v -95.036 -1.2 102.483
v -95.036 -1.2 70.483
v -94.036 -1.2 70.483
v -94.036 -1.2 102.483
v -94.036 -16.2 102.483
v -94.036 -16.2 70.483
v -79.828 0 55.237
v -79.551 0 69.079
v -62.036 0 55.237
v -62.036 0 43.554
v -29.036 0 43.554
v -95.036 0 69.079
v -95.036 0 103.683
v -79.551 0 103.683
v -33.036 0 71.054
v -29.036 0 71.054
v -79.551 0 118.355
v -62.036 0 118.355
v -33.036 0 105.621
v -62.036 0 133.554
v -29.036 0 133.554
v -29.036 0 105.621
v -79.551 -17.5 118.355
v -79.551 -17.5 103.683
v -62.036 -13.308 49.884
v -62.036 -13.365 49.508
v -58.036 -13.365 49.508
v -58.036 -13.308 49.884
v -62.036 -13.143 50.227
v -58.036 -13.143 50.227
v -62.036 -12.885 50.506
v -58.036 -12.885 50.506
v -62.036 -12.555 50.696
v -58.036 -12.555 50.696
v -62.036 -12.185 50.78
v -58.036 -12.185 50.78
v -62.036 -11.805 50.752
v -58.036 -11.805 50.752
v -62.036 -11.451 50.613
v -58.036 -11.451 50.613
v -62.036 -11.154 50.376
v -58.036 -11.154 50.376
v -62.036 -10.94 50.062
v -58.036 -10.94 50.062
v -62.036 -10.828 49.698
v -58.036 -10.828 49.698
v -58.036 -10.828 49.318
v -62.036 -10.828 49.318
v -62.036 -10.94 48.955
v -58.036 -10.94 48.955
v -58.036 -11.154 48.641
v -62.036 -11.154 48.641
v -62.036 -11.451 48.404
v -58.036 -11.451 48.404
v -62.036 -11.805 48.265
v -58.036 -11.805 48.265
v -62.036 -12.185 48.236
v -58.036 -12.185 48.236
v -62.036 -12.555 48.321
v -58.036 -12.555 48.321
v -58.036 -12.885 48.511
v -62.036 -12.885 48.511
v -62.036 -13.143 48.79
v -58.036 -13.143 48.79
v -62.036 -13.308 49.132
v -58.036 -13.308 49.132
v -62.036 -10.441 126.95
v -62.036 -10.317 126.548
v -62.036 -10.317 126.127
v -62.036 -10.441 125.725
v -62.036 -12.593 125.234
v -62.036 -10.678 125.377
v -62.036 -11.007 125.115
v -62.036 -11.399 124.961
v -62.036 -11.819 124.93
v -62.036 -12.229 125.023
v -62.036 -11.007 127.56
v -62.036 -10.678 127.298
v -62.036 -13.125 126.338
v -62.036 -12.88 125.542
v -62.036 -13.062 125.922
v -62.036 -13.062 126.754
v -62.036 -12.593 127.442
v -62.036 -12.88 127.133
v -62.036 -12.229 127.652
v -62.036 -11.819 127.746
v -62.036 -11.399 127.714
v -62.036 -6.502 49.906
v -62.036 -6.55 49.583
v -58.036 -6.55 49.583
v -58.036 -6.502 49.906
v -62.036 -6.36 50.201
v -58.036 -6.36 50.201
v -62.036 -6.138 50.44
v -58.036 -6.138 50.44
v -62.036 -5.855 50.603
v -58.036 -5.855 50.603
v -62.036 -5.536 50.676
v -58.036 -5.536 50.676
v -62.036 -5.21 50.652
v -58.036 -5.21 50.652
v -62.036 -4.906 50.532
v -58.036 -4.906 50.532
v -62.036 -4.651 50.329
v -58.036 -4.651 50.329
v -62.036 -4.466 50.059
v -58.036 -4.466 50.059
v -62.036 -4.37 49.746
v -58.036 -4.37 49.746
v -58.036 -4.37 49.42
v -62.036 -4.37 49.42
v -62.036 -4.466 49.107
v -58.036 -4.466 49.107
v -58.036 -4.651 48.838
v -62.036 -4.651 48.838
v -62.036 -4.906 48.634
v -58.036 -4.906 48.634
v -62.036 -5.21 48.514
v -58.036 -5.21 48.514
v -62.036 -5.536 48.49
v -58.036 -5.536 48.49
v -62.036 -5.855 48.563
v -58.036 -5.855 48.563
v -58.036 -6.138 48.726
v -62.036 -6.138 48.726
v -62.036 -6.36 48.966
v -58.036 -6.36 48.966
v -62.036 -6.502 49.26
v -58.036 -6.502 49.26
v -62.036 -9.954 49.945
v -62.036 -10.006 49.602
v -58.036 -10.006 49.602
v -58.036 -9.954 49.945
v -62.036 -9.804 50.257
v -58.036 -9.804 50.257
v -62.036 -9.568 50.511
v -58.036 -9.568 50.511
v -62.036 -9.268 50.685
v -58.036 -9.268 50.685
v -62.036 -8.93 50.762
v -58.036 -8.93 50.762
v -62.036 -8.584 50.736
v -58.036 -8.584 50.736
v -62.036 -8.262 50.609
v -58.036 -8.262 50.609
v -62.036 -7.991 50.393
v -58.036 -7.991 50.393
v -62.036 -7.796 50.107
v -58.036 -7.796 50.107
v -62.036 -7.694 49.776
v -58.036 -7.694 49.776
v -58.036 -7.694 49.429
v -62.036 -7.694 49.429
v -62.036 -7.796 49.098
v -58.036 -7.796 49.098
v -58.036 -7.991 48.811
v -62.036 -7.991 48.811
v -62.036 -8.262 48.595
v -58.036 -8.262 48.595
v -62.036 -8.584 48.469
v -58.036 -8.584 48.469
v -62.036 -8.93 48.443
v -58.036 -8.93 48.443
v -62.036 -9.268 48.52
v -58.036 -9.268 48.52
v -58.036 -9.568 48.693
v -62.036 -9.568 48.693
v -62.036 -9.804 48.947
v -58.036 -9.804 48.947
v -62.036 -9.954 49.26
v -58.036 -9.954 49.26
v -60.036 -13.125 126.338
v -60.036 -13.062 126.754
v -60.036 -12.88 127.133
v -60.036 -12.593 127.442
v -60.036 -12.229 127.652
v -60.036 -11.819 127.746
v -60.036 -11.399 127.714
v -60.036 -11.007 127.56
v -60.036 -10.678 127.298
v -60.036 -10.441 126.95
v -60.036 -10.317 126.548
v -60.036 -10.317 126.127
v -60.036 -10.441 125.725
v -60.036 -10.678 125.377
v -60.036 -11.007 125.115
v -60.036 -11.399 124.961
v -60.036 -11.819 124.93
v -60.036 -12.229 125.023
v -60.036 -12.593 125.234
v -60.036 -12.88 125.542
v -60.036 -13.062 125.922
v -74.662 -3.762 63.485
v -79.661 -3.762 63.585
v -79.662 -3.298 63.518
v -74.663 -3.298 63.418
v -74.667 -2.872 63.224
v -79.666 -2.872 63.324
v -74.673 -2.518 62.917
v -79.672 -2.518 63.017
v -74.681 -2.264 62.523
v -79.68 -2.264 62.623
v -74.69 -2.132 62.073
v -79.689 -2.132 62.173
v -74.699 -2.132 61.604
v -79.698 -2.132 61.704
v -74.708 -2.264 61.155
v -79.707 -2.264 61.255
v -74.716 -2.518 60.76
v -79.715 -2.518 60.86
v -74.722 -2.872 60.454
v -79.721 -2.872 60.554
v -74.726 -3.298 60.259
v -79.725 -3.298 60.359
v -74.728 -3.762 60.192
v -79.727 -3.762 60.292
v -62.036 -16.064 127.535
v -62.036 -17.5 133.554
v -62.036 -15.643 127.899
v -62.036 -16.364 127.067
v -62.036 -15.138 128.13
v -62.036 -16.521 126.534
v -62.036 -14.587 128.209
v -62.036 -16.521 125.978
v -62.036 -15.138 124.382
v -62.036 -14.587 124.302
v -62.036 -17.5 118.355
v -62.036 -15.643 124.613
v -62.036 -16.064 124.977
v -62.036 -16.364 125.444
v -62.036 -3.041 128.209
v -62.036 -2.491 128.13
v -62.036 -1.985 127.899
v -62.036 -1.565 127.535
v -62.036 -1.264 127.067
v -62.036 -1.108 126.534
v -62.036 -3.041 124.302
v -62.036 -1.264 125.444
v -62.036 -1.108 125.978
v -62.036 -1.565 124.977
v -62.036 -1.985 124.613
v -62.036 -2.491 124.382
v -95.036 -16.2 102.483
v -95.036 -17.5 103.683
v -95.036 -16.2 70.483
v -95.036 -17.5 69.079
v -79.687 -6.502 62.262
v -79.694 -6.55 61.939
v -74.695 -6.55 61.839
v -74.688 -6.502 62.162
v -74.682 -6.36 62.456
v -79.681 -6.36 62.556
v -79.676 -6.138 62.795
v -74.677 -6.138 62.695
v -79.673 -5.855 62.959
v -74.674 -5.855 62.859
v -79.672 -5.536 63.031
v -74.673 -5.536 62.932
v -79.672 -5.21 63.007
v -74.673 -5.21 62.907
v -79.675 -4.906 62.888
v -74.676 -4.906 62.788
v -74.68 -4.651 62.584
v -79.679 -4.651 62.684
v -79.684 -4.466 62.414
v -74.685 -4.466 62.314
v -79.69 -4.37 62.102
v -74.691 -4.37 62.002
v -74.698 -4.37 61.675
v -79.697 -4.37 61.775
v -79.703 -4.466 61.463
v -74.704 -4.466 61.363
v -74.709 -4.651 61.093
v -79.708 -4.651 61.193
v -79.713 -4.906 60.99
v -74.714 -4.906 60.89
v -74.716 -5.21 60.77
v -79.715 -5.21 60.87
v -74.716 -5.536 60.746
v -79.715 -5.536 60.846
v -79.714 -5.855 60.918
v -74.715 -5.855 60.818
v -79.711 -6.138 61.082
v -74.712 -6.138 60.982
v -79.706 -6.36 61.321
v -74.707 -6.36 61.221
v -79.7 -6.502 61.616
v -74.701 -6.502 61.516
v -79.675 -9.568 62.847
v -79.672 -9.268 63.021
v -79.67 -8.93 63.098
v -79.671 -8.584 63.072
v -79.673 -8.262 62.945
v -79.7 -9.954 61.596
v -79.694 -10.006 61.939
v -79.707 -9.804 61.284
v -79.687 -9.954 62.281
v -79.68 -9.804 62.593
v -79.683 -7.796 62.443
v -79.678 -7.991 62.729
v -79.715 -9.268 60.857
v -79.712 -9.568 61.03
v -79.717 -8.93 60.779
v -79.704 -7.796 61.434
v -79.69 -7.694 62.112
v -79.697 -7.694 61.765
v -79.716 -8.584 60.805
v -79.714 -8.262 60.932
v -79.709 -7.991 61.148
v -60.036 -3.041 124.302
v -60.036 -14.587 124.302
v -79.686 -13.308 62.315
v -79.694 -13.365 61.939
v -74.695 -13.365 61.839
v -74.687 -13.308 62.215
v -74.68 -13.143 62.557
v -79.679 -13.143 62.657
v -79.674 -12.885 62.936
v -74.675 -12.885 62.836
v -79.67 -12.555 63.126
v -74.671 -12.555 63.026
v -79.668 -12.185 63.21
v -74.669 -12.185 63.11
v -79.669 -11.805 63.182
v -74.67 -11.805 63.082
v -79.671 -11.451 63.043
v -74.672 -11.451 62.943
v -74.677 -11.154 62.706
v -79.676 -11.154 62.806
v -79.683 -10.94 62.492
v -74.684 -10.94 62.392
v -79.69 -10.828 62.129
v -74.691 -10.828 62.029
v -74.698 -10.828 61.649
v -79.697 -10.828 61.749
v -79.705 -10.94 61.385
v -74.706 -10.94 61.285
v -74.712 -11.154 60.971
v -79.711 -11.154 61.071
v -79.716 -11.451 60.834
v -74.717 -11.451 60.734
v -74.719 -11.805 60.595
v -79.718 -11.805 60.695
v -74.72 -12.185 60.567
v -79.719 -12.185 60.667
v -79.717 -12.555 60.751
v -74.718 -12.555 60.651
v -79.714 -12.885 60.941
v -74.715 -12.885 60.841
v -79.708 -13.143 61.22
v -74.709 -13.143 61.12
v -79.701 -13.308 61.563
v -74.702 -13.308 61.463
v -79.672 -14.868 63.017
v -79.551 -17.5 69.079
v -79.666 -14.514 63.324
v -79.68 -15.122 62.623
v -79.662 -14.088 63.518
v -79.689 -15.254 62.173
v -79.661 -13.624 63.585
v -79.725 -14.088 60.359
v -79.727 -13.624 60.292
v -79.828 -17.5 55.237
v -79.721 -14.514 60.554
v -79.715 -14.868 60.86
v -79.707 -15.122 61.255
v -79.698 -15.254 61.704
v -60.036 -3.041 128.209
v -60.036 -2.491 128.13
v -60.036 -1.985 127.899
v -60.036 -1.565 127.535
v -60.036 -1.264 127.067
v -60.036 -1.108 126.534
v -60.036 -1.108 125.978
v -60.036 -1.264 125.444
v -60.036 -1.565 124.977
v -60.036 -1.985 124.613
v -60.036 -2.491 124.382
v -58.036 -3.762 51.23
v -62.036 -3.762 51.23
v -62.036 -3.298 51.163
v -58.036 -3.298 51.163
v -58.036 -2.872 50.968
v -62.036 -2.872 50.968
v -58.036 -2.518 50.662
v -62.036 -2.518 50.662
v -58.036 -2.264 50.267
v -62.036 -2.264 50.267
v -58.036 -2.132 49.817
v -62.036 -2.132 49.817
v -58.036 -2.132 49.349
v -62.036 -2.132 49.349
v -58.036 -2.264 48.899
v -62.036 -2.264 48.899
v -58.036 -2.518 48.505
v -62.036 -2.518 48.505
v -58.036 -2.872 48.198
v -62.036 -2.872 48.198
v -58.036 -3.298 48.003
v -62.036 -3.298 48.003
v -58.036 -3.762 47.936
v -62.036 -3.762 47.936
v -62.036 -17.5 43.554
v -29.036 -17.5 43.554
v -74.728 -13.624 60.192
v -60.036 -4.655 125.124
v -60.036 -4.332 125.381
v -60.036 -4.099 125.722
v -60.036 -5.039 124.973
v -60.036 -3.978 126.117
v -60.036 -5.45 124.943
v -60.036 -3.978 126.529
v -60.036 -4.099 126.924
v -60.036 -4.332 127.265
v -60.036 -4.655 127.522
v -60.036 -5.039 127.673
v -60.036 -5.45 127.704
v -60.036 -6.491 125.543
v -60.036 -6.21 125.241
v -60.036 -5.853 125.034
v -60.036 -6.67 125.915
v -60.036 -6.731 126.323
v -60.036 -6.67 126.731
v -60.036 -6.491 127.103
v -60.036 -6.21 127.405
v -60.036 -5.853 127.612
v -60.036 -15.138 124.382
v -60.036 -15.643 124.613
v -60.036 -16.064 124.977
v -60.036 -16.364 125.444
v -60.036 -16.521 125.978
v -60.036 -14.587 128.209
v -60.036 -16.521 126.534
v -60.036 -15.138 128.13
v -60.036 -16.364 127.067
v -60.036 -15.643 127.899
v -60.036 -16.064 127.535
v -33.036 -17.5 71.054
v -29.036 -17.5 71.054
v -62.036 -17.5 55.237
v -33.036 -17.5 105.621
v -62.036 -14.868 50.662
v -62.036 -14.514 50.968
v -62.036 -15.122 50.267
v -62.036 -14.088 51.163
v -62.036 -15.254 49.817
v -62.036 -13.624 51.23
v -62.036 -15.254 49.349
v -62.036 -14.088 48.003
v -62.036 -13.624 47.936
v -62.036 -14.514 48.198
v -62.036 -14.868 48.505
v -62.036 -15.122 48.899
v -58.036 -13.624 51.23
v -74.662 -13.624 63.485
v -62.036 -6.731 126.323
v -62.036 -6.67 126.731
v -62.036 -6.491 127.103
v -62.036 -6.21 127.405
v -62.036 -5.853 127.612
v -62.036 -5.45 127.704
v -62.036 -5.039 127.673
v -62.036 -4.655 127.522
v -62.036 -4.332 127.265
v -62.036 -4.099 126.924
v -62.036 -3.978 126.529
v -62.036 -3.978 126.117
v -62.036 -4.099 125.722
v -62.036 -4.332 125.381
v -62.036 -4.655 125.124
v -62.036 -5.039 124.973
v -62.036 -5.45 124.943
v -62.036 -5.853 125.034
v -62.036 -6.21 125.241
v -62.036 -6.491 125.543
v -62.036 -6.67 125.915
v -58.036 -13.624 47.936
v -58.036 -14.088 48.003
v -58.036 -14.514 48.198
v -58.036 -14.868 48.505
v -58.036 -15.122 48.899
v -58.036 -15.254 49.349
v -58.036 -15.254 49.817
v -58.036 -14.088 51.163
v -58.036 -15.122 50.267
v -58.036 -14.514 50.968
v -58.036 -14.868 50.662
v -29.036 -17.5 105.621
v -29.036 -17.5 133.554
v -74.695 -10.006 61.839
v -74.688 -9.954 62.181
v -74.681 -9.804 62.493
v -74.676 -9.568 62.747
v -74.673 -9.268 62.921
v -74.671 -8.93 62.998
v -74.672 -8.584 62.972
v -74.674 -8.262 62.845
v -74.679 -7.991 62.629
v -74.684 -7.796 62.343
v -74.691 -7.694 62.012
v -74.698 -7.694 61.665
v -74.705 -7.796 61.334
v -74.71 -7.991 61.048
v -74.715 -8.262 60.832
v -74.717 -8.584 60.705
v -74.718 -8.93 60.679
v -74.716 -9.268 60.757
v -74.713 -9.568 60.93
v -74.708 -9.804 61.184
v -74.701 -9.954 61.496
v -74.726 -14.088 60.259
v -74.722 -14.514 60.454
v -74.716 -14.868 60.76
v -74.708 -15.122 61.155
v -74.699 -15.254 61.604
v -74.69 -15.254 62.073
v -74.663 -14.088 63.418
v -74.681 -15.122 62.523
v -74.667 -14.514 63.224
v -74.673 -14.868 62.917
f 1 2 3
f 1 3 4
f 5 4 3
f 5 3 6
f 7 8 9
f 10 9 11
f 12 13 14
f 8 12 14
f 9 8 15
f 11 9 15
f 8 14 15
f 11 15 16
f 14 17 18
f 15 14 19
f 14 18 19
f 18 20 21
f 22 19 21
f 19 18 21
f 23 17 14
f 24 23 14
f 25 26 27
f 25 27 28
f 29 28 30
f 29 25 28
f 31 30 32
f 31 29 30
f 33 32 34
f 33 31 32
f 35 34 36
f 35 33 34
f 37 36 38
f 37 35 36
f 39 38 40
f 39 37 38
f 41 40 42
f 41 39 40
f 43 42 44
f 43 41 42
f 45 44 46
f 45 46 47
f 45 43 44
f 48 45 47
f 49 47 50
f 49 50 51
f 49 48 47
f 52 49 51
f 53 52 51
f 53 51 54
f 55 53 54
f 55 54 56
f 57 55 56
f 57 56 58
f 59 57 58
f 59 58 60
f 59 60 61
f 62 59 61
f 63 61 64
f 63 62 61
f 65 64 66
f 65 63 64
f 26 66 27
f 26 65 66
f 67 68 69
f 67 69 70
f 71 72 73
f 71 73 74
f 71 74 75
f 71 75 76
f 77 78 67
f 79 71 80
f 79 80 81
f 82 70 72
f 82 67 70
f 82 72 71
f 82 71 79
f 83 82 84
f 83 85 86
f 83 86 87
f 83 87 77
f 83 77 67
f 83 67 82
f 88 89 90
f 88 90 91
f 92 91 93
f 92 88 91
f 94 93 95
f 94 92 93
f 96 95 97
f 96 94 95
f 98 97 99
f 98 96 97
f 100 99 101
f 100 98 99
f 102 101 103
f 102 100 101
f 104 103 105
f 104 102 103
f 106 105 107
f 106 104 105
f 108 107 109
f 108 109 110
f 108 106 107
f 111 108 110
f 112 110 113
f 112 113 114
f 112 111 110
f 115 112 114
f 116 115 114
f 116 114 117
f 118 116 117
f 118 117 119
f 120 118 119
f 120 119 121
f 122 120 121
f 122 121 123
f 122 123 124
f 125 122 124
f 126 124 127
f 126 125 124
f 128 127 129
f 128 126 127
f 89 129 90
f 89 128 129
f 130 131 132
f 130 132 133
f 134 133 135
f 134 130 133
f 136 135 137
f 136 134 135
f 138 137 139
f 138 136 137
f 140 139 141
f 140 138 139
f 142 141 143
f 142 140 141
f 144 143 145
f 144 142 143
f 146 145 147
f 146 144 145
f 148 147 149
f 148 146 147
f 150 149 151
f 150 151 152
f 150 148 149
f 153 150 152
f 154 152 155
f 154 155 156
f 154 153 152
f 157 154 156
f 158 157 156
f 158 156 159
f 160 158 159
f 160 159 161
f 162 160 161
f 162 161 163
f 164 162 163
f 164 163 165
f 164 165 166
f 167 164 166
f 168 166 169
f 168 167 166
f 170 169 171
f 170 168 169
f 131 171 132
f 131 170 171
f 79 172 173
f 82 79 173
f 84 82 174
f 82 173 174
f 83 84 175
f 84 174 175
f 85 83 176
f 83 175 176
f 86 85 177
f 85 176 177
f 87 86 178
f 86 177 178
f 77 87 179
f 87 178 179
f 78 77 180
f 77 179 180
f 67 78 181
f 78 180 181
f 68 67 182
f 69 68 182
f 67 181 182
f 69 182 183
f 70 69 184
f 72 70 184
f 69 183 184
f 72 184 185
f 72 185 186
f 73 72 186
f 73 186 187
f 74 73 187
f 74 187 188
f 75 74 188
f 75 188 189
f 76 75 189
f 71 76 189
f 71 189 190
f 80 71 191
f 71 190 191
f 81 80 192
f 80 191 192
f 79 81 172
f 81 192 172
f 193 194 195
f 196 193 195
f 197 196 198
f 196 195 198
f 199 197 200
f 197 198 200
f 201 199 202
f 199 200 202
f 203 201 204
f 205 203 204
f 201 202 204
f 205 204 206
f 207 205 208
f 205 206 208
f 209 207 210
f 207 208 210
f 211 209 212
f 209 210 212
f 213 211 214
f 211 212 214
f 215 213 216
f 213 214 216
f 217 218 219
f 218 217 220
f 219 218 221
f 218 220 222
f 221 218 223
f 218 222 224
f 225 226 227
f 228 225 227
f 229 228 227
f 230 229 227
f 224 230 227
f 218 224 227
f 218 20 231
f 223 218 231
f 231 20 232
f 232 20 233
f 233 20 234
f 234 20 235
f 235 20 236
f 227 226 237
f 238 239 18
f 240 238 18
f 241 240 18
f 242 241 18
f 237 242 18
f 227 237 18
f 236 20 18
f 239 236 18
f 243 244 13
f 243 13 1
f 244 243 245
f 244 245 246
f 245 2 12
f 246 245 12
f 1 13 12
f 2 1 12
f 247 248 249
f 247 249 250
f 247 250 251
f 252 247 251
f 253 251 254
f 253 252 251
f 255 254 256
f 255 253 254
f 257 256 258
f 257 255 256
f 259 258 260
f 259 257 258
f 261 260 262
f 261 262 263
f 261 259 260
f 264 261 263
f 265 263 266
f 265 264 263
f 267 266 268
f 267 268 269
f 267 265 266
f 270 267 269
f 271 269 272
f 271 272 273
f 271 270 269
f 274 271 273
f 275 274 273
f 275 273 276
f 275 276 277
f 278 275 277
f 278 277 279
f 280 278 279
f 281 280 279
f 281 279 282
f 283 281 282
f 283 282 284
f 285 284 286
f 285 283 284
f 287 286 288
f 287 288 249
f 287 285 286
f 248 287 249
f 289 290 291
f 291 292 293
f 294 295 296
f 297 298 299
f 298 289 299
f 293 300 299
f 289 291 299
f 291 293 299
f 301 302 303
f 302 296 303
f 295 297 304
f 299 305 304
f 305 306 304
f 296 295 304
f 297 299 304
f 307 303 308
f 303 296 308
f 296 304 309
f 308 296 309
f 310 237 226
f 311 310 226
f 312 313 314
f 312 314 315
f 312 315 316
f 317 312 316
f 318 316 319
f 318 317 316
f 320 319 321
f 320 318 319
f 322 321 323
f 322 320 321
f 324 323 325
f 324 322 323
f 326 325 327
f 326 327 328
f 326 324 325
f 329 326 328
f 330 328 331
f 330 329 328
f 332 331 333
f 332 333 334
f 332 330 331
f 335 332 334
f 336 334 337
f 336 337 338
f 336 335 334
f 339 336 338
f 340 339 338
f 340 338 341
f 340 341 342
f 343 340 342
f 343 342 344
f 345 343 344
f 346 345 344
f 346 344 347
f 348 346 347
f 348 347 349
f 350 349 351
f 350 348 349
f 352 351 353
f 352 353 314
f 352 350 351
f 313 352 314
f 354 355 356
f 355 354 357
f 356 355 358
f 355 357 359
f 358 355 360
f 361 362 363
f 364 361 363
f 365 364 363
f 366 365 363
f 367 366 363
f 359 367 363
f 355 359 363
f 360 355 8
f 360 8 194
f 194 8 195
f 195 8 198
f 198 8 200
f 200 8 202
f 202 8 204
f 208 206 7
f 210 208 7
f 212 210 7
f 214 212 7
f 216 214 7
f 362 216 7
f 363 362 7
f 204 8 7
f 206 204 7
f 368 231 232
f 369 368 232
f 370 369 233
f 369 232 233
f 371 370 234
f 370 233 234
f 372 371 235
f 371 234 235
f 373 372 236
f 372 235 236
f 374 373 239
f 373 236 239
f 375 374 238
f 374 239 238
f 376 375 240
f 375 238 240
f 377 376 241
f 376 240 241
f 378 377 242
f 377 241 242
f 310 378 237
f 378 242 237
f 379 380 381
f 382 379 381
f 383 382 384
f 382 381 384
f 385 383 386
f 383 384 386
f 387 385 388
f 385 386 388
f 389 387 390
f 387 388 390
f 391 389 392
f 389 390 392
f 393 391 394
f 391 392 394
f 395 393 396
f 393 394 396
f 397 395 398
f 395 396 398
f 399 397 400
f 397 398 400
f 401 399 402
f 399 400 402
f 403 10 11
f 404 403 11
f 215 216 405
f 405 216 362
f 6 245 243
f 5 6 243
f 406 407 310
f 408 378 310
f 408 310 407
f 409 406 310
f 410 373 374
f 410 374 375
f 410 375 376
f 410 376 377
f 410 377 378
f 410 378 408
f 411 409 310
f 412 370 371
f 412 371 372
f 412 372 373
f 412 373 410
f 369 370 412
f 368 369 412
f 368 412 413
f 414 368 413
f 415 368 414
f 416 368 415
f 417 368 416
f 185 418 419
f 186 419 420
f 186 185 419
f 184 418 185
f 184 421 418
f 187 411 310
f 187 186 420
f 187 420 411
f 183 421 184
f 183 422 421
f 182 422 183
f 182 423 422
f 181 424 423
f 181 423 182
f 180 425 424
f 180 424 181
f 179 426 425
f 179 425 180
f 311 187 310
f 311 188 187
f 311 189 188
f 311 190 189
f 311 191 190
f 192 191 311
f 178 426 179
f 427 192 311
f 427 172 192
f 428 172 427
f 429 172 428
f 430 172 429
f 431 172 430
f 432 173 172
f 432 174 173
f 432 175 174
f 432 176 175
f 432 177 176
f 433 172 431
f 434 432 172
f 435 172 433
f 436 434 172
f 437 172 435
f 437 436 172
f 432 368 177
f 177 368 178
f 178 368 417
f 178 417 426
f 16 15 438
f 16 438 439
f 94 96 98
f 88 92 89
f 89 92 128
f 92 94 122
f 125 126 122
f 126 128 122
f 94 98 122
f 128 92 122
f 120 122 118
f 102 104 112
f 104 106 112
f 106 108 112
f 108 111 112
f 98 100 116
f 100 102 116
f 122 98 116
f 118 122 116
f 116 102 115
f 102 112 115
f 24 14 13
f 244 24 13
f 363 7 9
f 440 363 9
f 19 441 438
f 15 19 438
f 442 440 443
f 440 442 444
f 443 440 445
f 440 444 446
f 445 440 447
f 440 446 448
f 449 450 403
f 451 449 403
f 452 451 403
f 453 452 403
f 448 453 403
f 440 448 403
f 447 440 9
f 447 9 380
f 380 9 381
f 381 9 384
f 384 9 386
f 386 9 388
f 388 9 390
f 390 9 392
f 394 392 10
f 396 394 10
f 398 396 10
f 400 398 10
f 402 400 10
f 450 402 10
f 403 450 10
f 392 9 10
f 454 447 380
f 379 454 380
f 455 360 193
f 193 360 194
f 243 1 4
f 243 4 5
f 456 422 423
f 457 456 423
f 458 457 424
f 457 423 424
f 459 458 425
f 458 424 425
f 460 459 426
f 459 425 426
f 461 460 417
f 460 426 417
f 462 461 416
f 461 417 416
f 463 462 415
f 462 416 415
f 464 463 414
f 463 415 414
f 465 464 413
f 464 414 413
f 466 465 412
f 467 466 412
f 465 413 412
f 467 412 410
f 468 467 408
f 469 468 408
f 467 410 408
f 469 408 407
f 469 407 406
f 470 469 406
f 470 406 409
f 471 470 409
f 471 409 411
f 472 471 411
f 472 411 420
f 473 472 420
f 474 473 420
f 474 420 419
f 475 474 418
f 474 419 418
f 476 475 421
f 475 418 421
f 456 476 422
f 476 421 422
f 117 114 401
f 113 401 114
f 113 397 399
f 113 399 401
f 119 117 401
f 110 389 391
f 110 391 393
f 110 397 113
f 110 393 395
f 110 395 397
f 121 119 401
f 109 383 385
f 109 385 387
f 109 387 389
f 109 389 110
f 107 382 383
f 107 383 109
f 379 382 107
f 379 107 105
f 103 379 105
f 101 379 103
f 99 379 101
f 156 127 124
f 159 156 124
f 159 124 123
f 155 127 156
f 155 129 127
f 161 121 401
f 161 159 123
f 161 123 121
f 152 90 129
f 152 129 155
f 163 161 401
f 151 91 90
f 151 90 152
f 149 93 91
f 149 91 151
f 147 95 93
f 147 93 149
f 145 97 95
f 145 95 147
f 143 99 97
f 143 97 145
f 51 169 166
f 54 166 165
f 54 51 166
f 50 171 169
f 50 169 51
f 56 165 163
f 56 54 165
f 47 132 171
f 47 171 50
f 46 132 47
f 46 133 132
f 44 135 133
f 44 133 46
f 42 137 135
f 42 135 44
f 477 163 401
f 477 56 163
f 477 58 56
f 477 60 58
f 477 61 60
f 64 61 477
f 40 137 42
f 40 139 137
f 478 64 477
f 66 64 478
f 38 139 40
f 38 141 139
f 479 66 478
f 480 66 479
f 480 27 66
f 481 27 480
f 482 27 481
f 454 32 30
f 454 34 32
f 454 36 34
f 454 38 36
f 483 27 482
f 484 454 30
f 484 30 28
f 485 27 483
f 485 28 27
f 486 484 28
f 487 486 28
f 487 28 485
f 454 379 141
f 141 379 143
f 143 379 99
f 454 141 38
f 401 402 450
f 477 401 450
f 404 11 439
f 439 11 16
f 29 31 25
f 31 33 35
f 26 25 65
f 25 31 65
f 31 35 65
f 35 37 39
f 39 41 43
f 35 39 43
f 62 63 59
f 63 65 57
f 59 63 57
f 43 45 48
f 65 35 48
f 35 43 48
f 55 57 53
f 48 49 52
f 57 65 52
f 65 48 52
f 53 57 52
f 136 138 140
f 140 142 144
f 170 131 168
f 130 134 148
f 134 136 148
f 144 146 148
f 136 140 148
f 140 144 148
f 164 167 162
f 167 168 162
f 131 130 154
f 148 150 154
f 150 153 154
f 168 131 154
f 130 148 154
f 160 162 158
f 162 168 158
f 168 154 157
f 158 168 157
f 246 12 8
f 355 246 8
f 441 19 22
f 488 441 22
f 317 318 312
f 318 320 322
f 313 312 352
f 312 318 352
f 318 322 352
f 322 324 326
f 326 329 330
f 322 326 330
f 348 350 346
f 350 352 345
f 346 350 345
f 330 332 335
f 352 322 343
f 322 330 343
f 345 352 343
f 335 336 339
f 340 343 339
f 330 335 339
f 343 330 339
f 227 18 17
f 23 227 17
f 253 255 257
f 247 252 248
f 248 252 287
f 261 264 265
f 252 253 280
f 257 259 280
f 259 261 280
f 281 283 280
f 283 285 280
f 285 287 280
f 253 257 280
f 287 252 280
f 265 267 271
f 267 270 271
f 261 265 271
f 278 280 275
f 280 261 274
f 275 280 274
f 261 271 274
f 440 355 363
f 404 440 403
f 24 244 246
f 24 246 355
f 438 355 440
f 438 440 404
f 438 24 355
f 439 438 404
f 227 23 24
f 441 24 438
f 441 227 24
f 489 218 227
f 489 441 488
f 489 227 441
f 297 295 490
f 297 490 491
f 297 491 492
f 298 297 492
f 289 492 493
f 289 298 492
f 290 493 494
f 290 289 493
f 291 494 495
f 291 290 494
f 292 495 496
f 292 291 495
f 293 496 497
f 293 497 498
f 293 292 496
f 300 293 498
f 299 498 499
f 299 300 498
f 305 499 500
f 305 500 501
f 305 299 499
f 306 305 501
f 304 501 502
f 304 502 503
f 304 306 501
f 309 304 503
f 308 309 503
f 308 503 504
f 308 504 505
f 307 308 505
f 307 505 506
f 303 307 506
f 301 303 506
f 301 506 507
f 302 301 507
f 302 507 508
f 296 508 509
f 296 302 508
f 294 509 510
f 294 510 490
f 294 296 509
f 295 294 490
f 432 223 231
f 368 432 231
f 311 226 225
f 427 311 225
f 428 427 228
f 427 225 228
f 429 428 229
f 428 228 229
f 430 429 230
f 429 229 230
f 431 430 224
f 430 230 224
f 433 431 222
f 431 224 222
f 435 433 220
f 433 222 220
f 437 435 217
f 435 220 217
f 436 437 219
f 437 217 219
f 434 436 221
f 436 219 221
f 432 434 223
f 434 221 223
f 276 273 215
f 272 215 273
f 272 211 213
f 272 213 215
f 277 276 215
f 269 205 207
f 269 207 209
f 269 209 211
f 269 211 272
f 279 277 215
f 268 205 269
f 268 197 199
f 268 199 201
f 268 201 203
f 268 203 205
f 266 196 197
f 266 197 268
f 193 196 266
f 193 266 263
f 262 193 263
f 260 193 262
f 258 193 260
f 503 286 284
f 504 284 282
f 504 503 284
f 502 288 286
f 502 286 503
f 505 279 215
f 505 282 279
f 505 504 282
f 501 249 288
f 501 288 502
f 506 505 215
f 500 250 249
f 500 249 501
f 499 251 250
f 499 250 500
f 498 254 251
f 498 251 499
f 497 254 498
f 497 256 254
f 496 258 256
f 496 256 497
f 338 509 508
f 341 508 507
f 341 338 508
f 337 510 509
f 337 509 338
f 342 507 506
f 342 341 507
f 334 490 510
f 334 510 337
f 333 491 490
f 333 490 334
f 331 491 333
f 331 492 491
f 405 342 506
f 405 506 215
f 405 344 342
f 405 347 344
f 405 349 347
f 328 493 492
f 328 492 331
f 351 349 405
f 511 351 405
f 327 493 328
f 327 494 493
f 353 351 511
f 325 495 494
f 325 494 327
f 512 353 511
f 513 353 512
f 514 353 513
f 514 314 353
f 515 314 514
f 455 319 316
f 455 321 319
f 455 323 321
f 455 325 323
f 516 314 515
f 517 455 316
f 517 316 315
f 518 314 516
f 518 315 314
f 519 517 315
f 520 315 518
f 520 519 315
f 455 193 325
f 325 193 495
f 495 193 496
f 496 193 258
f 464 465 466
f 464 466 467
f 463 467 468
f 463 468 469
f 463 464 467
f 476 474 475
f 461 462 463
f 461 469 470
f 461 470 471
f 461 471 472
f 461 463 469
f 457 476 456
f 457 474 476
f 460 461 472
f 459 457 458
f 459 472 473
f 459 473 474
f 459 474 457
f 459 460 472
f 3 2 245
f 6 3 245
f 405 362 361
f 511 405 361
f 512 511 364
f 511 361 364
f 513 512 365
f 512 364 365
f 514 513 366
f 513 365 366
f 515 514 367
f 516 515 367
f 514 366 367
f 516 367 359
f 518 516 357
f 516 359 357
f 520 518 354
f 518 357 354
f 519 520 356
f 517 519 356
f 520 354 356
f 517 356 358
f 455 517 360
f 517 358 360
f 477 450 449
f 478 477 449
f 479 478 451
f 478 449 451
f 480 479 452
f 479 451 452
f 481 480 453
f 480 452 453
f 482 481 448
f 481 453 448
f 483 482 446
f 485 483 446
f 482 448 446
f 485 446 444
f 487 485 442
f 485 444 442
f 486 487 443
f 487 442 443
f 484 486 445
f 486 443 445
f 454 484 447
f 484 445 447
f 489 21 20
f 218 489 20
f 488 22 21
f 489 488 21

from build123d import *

# Parameters (mm, degrees)
F1_DEPTH  = 17.5
F3_DEPTH  = 2
F4_R      = 1.3844066796
F4_R_2    = 1.4118495886
F5_DEPTH  = 2
F6_R      = 1.09615194
F6_R_2    = 1.1626457349
F6_R_3    = 1.2756503746
F7_DEPTH  = 4
F9_DEPTH  = 42.8725
F8_W      = 4
F8_H      = 17.0664954185
F8_H_2    = 17.5
F10_DEPTH = 25
F11_R     = 1.09615194
F11_R_2   = 1.1626457349
F11_R_3   = 1.2756503746
F12_DEPTH = 5
F13_W     = 15
F13_H     = 32
F14_DEPTH = 1


with BuildPart() as f1:
    # F0 (on Front) → F1 (new body)
    with BuildSketch(Plane.XZ):
        Polygon((-29.036315158, 133.554469943), (-62.036315158, 133.554469943), (-62.036315158, 118.3553636074), (-79.5507803559, 118.3553636074), (-79.5507803559, 103.6831215024), (-95.036315158, 103.6831215024), (-95.036315158, 69.0787881613), (-79.5507803559, 69.0787881613), (-79.8276141286, 55.2370585501), (-62.036315158, 55.2370585501), (-62.036315158, 43.554469943), (-29.036315158, 43.554469943), (-29.036315158, 66.5872767568), (-34.9804013968, 66.5872767568), (-34.9804013968, 105.6209653616), (-29.036315158, 105.6209653616), align=None)
    extrude(amount=F1_DEPTH)

    # F2 (on face) → F3 (cut)
    with BuildSketch(Plane(origin=(-62.036315158, 0, 0), x_dir=(0, -1, 0), z_dir=(-1, 0, 0))):
        with BuildLine():
            Line((14.58732225, 128.2094269991), (3.0413551722, 128.2094269991))
            ThreePointArc((3.0413551722, 128.2094269991), (1.0878725443, 126.2559443712), (3.0413551722, 124.3024617434))
            Line((3.0413551722, 124.3024617434), (14.58732225, 124.3024617434))
            ThreePointArc((14.58732225, 124.3024617434), (16.5408048779, 126.2559443712), (14.58732225, 128.2094269991))
        make_face()
    extrude(amount=-F3_DEPTH, mode=Mode.SUBTRACT)

    # F4 (on face) → F5 (join)
    with BuildSketch(Plane(origin=(-60.036315158, 0, 0), x_dir=(0, -1, 0), z_dir=(-1, 0, 0))):
        with Locations((5.3467825055, 126.3230890036)):
            Circle(F4_R)
        with Locations((11.7130186409, 126.3377517462)):
            Circle(F4_R_2)
    extrude(amount=F5_DEPTH)

    # F6 (on face) → F7 (cut)
    with BuildSketch(Plane(origin=(-62.036315158, 0, 0), x_dir=(0, -1, 0), z_dir=(-1, 0, 0))):
        with BuildLine():
            Line((13.6235784739, 51.2298978865), (3.7623266689, 51.2298978865))
            ThreePointArc((3.7623266689, 51.2298978865), (2.1155080758, 49.5830792934), (3.7623266689, 47.9362607002))
            Line((3.7623266689, 47.9362607002), (13.6235784739, 47.9362607002))
            ThreePointArc((13.6235784739, 47.9362607002), (15.2703970671, 49.5830792934), (13.6235784739, 51.2298978865))
        make_face()
        with Locations((5.4540927522, 49.5830792934)):
            Circle(F6_R, mode=Mode.SUBTRACT)
        with Locations((8.8431918994, 49.6022440493)):
            Circle(F6_R_2, mode=Mode.SUBTRACT)
        with Locations((12.0892226696, 49.5083071291)):
            Circle(F6_R_3, mode=Mode.SUBTRACT)
    extrude(amount=-F7_DEPTH, mode=Mode.SUBTRACT)

    # F9 (add): a face of the model
    f9_faces = [f1.faces().sort_by_distance(p)[0] for p in [
        (-32.0083582774, -8.75, 105.6209653616),
    ]]
    extrude(f9_faces, amount=F9_DEPTH)

    # F8 (on face) → F10 (cut)
    with BuildSketch(Plane.XZ.offset(17.5)):
        with Locations((-31.036315158, 97.0877176523)):
            Rectangle(F8_W, F8_H)
        with Locations((-31.036315158, 79.804469943)):
            Rectangle(F8_W, F8_H_2)
    extrude(amount=-F10_DEPTH, mode=Mode.SUBTRACT)

    # F11 (on face) → F12 (cut)
    with BuildSketch(Plane(origin=(-80.8999922237, 0, 1.6179950544), x_dir=(0, -1, 0), z_dir=(-0.9998000612, 0, 0.019995942))):
        with BuildLine():
            Line((13.6235784739, 61.979509742), (3.7623266689, 61.979509742))
            ThreePointArc((3.7623266689, 61.979509742), (2.1155080758, 60.3326911488), (3.7623266689, 58.6858725557))
            Line((3.7623266689, 58.6858725557), (13.6235784739, 58.6858725557))
            ThreePointArc((13.6235784739, 58.6858725557), (15.2703970671, 60.3326911488), (13.6235784739, 61.979509742))
        make_face()
        with Locations((5.4540927522, 60.3326911488)):
            Circle(F11_R, mode=Mode.SUBTRACT)
        with Locations((8.8431918994, 60.3326911488)):
            Circle(F11_R_2, mode=Mode.SUBTRACT)
        with Locations((12.0892226696, 60.3326911488)):
            Circle(F11_R_3, mode=Mode.SUBTRACT)
    extrude(amount=-F12_DEPTH, mode=Mode.SUBTRACT)

    # F13 (on face) → F14 (cut)
    with BuildSketch(Plane(origin=(-95.036315158, 0, 0), x_dir=(0, -1, 0), z_dir=(-1, 0, 0))):
        with Locations((8.7, 86.4831215024)):
            Rectangle(F13_W, F13_H)
    extrude(amount=-F14_DEPTH, mode=Mode.SUBTRACT)


solid = f1.part
